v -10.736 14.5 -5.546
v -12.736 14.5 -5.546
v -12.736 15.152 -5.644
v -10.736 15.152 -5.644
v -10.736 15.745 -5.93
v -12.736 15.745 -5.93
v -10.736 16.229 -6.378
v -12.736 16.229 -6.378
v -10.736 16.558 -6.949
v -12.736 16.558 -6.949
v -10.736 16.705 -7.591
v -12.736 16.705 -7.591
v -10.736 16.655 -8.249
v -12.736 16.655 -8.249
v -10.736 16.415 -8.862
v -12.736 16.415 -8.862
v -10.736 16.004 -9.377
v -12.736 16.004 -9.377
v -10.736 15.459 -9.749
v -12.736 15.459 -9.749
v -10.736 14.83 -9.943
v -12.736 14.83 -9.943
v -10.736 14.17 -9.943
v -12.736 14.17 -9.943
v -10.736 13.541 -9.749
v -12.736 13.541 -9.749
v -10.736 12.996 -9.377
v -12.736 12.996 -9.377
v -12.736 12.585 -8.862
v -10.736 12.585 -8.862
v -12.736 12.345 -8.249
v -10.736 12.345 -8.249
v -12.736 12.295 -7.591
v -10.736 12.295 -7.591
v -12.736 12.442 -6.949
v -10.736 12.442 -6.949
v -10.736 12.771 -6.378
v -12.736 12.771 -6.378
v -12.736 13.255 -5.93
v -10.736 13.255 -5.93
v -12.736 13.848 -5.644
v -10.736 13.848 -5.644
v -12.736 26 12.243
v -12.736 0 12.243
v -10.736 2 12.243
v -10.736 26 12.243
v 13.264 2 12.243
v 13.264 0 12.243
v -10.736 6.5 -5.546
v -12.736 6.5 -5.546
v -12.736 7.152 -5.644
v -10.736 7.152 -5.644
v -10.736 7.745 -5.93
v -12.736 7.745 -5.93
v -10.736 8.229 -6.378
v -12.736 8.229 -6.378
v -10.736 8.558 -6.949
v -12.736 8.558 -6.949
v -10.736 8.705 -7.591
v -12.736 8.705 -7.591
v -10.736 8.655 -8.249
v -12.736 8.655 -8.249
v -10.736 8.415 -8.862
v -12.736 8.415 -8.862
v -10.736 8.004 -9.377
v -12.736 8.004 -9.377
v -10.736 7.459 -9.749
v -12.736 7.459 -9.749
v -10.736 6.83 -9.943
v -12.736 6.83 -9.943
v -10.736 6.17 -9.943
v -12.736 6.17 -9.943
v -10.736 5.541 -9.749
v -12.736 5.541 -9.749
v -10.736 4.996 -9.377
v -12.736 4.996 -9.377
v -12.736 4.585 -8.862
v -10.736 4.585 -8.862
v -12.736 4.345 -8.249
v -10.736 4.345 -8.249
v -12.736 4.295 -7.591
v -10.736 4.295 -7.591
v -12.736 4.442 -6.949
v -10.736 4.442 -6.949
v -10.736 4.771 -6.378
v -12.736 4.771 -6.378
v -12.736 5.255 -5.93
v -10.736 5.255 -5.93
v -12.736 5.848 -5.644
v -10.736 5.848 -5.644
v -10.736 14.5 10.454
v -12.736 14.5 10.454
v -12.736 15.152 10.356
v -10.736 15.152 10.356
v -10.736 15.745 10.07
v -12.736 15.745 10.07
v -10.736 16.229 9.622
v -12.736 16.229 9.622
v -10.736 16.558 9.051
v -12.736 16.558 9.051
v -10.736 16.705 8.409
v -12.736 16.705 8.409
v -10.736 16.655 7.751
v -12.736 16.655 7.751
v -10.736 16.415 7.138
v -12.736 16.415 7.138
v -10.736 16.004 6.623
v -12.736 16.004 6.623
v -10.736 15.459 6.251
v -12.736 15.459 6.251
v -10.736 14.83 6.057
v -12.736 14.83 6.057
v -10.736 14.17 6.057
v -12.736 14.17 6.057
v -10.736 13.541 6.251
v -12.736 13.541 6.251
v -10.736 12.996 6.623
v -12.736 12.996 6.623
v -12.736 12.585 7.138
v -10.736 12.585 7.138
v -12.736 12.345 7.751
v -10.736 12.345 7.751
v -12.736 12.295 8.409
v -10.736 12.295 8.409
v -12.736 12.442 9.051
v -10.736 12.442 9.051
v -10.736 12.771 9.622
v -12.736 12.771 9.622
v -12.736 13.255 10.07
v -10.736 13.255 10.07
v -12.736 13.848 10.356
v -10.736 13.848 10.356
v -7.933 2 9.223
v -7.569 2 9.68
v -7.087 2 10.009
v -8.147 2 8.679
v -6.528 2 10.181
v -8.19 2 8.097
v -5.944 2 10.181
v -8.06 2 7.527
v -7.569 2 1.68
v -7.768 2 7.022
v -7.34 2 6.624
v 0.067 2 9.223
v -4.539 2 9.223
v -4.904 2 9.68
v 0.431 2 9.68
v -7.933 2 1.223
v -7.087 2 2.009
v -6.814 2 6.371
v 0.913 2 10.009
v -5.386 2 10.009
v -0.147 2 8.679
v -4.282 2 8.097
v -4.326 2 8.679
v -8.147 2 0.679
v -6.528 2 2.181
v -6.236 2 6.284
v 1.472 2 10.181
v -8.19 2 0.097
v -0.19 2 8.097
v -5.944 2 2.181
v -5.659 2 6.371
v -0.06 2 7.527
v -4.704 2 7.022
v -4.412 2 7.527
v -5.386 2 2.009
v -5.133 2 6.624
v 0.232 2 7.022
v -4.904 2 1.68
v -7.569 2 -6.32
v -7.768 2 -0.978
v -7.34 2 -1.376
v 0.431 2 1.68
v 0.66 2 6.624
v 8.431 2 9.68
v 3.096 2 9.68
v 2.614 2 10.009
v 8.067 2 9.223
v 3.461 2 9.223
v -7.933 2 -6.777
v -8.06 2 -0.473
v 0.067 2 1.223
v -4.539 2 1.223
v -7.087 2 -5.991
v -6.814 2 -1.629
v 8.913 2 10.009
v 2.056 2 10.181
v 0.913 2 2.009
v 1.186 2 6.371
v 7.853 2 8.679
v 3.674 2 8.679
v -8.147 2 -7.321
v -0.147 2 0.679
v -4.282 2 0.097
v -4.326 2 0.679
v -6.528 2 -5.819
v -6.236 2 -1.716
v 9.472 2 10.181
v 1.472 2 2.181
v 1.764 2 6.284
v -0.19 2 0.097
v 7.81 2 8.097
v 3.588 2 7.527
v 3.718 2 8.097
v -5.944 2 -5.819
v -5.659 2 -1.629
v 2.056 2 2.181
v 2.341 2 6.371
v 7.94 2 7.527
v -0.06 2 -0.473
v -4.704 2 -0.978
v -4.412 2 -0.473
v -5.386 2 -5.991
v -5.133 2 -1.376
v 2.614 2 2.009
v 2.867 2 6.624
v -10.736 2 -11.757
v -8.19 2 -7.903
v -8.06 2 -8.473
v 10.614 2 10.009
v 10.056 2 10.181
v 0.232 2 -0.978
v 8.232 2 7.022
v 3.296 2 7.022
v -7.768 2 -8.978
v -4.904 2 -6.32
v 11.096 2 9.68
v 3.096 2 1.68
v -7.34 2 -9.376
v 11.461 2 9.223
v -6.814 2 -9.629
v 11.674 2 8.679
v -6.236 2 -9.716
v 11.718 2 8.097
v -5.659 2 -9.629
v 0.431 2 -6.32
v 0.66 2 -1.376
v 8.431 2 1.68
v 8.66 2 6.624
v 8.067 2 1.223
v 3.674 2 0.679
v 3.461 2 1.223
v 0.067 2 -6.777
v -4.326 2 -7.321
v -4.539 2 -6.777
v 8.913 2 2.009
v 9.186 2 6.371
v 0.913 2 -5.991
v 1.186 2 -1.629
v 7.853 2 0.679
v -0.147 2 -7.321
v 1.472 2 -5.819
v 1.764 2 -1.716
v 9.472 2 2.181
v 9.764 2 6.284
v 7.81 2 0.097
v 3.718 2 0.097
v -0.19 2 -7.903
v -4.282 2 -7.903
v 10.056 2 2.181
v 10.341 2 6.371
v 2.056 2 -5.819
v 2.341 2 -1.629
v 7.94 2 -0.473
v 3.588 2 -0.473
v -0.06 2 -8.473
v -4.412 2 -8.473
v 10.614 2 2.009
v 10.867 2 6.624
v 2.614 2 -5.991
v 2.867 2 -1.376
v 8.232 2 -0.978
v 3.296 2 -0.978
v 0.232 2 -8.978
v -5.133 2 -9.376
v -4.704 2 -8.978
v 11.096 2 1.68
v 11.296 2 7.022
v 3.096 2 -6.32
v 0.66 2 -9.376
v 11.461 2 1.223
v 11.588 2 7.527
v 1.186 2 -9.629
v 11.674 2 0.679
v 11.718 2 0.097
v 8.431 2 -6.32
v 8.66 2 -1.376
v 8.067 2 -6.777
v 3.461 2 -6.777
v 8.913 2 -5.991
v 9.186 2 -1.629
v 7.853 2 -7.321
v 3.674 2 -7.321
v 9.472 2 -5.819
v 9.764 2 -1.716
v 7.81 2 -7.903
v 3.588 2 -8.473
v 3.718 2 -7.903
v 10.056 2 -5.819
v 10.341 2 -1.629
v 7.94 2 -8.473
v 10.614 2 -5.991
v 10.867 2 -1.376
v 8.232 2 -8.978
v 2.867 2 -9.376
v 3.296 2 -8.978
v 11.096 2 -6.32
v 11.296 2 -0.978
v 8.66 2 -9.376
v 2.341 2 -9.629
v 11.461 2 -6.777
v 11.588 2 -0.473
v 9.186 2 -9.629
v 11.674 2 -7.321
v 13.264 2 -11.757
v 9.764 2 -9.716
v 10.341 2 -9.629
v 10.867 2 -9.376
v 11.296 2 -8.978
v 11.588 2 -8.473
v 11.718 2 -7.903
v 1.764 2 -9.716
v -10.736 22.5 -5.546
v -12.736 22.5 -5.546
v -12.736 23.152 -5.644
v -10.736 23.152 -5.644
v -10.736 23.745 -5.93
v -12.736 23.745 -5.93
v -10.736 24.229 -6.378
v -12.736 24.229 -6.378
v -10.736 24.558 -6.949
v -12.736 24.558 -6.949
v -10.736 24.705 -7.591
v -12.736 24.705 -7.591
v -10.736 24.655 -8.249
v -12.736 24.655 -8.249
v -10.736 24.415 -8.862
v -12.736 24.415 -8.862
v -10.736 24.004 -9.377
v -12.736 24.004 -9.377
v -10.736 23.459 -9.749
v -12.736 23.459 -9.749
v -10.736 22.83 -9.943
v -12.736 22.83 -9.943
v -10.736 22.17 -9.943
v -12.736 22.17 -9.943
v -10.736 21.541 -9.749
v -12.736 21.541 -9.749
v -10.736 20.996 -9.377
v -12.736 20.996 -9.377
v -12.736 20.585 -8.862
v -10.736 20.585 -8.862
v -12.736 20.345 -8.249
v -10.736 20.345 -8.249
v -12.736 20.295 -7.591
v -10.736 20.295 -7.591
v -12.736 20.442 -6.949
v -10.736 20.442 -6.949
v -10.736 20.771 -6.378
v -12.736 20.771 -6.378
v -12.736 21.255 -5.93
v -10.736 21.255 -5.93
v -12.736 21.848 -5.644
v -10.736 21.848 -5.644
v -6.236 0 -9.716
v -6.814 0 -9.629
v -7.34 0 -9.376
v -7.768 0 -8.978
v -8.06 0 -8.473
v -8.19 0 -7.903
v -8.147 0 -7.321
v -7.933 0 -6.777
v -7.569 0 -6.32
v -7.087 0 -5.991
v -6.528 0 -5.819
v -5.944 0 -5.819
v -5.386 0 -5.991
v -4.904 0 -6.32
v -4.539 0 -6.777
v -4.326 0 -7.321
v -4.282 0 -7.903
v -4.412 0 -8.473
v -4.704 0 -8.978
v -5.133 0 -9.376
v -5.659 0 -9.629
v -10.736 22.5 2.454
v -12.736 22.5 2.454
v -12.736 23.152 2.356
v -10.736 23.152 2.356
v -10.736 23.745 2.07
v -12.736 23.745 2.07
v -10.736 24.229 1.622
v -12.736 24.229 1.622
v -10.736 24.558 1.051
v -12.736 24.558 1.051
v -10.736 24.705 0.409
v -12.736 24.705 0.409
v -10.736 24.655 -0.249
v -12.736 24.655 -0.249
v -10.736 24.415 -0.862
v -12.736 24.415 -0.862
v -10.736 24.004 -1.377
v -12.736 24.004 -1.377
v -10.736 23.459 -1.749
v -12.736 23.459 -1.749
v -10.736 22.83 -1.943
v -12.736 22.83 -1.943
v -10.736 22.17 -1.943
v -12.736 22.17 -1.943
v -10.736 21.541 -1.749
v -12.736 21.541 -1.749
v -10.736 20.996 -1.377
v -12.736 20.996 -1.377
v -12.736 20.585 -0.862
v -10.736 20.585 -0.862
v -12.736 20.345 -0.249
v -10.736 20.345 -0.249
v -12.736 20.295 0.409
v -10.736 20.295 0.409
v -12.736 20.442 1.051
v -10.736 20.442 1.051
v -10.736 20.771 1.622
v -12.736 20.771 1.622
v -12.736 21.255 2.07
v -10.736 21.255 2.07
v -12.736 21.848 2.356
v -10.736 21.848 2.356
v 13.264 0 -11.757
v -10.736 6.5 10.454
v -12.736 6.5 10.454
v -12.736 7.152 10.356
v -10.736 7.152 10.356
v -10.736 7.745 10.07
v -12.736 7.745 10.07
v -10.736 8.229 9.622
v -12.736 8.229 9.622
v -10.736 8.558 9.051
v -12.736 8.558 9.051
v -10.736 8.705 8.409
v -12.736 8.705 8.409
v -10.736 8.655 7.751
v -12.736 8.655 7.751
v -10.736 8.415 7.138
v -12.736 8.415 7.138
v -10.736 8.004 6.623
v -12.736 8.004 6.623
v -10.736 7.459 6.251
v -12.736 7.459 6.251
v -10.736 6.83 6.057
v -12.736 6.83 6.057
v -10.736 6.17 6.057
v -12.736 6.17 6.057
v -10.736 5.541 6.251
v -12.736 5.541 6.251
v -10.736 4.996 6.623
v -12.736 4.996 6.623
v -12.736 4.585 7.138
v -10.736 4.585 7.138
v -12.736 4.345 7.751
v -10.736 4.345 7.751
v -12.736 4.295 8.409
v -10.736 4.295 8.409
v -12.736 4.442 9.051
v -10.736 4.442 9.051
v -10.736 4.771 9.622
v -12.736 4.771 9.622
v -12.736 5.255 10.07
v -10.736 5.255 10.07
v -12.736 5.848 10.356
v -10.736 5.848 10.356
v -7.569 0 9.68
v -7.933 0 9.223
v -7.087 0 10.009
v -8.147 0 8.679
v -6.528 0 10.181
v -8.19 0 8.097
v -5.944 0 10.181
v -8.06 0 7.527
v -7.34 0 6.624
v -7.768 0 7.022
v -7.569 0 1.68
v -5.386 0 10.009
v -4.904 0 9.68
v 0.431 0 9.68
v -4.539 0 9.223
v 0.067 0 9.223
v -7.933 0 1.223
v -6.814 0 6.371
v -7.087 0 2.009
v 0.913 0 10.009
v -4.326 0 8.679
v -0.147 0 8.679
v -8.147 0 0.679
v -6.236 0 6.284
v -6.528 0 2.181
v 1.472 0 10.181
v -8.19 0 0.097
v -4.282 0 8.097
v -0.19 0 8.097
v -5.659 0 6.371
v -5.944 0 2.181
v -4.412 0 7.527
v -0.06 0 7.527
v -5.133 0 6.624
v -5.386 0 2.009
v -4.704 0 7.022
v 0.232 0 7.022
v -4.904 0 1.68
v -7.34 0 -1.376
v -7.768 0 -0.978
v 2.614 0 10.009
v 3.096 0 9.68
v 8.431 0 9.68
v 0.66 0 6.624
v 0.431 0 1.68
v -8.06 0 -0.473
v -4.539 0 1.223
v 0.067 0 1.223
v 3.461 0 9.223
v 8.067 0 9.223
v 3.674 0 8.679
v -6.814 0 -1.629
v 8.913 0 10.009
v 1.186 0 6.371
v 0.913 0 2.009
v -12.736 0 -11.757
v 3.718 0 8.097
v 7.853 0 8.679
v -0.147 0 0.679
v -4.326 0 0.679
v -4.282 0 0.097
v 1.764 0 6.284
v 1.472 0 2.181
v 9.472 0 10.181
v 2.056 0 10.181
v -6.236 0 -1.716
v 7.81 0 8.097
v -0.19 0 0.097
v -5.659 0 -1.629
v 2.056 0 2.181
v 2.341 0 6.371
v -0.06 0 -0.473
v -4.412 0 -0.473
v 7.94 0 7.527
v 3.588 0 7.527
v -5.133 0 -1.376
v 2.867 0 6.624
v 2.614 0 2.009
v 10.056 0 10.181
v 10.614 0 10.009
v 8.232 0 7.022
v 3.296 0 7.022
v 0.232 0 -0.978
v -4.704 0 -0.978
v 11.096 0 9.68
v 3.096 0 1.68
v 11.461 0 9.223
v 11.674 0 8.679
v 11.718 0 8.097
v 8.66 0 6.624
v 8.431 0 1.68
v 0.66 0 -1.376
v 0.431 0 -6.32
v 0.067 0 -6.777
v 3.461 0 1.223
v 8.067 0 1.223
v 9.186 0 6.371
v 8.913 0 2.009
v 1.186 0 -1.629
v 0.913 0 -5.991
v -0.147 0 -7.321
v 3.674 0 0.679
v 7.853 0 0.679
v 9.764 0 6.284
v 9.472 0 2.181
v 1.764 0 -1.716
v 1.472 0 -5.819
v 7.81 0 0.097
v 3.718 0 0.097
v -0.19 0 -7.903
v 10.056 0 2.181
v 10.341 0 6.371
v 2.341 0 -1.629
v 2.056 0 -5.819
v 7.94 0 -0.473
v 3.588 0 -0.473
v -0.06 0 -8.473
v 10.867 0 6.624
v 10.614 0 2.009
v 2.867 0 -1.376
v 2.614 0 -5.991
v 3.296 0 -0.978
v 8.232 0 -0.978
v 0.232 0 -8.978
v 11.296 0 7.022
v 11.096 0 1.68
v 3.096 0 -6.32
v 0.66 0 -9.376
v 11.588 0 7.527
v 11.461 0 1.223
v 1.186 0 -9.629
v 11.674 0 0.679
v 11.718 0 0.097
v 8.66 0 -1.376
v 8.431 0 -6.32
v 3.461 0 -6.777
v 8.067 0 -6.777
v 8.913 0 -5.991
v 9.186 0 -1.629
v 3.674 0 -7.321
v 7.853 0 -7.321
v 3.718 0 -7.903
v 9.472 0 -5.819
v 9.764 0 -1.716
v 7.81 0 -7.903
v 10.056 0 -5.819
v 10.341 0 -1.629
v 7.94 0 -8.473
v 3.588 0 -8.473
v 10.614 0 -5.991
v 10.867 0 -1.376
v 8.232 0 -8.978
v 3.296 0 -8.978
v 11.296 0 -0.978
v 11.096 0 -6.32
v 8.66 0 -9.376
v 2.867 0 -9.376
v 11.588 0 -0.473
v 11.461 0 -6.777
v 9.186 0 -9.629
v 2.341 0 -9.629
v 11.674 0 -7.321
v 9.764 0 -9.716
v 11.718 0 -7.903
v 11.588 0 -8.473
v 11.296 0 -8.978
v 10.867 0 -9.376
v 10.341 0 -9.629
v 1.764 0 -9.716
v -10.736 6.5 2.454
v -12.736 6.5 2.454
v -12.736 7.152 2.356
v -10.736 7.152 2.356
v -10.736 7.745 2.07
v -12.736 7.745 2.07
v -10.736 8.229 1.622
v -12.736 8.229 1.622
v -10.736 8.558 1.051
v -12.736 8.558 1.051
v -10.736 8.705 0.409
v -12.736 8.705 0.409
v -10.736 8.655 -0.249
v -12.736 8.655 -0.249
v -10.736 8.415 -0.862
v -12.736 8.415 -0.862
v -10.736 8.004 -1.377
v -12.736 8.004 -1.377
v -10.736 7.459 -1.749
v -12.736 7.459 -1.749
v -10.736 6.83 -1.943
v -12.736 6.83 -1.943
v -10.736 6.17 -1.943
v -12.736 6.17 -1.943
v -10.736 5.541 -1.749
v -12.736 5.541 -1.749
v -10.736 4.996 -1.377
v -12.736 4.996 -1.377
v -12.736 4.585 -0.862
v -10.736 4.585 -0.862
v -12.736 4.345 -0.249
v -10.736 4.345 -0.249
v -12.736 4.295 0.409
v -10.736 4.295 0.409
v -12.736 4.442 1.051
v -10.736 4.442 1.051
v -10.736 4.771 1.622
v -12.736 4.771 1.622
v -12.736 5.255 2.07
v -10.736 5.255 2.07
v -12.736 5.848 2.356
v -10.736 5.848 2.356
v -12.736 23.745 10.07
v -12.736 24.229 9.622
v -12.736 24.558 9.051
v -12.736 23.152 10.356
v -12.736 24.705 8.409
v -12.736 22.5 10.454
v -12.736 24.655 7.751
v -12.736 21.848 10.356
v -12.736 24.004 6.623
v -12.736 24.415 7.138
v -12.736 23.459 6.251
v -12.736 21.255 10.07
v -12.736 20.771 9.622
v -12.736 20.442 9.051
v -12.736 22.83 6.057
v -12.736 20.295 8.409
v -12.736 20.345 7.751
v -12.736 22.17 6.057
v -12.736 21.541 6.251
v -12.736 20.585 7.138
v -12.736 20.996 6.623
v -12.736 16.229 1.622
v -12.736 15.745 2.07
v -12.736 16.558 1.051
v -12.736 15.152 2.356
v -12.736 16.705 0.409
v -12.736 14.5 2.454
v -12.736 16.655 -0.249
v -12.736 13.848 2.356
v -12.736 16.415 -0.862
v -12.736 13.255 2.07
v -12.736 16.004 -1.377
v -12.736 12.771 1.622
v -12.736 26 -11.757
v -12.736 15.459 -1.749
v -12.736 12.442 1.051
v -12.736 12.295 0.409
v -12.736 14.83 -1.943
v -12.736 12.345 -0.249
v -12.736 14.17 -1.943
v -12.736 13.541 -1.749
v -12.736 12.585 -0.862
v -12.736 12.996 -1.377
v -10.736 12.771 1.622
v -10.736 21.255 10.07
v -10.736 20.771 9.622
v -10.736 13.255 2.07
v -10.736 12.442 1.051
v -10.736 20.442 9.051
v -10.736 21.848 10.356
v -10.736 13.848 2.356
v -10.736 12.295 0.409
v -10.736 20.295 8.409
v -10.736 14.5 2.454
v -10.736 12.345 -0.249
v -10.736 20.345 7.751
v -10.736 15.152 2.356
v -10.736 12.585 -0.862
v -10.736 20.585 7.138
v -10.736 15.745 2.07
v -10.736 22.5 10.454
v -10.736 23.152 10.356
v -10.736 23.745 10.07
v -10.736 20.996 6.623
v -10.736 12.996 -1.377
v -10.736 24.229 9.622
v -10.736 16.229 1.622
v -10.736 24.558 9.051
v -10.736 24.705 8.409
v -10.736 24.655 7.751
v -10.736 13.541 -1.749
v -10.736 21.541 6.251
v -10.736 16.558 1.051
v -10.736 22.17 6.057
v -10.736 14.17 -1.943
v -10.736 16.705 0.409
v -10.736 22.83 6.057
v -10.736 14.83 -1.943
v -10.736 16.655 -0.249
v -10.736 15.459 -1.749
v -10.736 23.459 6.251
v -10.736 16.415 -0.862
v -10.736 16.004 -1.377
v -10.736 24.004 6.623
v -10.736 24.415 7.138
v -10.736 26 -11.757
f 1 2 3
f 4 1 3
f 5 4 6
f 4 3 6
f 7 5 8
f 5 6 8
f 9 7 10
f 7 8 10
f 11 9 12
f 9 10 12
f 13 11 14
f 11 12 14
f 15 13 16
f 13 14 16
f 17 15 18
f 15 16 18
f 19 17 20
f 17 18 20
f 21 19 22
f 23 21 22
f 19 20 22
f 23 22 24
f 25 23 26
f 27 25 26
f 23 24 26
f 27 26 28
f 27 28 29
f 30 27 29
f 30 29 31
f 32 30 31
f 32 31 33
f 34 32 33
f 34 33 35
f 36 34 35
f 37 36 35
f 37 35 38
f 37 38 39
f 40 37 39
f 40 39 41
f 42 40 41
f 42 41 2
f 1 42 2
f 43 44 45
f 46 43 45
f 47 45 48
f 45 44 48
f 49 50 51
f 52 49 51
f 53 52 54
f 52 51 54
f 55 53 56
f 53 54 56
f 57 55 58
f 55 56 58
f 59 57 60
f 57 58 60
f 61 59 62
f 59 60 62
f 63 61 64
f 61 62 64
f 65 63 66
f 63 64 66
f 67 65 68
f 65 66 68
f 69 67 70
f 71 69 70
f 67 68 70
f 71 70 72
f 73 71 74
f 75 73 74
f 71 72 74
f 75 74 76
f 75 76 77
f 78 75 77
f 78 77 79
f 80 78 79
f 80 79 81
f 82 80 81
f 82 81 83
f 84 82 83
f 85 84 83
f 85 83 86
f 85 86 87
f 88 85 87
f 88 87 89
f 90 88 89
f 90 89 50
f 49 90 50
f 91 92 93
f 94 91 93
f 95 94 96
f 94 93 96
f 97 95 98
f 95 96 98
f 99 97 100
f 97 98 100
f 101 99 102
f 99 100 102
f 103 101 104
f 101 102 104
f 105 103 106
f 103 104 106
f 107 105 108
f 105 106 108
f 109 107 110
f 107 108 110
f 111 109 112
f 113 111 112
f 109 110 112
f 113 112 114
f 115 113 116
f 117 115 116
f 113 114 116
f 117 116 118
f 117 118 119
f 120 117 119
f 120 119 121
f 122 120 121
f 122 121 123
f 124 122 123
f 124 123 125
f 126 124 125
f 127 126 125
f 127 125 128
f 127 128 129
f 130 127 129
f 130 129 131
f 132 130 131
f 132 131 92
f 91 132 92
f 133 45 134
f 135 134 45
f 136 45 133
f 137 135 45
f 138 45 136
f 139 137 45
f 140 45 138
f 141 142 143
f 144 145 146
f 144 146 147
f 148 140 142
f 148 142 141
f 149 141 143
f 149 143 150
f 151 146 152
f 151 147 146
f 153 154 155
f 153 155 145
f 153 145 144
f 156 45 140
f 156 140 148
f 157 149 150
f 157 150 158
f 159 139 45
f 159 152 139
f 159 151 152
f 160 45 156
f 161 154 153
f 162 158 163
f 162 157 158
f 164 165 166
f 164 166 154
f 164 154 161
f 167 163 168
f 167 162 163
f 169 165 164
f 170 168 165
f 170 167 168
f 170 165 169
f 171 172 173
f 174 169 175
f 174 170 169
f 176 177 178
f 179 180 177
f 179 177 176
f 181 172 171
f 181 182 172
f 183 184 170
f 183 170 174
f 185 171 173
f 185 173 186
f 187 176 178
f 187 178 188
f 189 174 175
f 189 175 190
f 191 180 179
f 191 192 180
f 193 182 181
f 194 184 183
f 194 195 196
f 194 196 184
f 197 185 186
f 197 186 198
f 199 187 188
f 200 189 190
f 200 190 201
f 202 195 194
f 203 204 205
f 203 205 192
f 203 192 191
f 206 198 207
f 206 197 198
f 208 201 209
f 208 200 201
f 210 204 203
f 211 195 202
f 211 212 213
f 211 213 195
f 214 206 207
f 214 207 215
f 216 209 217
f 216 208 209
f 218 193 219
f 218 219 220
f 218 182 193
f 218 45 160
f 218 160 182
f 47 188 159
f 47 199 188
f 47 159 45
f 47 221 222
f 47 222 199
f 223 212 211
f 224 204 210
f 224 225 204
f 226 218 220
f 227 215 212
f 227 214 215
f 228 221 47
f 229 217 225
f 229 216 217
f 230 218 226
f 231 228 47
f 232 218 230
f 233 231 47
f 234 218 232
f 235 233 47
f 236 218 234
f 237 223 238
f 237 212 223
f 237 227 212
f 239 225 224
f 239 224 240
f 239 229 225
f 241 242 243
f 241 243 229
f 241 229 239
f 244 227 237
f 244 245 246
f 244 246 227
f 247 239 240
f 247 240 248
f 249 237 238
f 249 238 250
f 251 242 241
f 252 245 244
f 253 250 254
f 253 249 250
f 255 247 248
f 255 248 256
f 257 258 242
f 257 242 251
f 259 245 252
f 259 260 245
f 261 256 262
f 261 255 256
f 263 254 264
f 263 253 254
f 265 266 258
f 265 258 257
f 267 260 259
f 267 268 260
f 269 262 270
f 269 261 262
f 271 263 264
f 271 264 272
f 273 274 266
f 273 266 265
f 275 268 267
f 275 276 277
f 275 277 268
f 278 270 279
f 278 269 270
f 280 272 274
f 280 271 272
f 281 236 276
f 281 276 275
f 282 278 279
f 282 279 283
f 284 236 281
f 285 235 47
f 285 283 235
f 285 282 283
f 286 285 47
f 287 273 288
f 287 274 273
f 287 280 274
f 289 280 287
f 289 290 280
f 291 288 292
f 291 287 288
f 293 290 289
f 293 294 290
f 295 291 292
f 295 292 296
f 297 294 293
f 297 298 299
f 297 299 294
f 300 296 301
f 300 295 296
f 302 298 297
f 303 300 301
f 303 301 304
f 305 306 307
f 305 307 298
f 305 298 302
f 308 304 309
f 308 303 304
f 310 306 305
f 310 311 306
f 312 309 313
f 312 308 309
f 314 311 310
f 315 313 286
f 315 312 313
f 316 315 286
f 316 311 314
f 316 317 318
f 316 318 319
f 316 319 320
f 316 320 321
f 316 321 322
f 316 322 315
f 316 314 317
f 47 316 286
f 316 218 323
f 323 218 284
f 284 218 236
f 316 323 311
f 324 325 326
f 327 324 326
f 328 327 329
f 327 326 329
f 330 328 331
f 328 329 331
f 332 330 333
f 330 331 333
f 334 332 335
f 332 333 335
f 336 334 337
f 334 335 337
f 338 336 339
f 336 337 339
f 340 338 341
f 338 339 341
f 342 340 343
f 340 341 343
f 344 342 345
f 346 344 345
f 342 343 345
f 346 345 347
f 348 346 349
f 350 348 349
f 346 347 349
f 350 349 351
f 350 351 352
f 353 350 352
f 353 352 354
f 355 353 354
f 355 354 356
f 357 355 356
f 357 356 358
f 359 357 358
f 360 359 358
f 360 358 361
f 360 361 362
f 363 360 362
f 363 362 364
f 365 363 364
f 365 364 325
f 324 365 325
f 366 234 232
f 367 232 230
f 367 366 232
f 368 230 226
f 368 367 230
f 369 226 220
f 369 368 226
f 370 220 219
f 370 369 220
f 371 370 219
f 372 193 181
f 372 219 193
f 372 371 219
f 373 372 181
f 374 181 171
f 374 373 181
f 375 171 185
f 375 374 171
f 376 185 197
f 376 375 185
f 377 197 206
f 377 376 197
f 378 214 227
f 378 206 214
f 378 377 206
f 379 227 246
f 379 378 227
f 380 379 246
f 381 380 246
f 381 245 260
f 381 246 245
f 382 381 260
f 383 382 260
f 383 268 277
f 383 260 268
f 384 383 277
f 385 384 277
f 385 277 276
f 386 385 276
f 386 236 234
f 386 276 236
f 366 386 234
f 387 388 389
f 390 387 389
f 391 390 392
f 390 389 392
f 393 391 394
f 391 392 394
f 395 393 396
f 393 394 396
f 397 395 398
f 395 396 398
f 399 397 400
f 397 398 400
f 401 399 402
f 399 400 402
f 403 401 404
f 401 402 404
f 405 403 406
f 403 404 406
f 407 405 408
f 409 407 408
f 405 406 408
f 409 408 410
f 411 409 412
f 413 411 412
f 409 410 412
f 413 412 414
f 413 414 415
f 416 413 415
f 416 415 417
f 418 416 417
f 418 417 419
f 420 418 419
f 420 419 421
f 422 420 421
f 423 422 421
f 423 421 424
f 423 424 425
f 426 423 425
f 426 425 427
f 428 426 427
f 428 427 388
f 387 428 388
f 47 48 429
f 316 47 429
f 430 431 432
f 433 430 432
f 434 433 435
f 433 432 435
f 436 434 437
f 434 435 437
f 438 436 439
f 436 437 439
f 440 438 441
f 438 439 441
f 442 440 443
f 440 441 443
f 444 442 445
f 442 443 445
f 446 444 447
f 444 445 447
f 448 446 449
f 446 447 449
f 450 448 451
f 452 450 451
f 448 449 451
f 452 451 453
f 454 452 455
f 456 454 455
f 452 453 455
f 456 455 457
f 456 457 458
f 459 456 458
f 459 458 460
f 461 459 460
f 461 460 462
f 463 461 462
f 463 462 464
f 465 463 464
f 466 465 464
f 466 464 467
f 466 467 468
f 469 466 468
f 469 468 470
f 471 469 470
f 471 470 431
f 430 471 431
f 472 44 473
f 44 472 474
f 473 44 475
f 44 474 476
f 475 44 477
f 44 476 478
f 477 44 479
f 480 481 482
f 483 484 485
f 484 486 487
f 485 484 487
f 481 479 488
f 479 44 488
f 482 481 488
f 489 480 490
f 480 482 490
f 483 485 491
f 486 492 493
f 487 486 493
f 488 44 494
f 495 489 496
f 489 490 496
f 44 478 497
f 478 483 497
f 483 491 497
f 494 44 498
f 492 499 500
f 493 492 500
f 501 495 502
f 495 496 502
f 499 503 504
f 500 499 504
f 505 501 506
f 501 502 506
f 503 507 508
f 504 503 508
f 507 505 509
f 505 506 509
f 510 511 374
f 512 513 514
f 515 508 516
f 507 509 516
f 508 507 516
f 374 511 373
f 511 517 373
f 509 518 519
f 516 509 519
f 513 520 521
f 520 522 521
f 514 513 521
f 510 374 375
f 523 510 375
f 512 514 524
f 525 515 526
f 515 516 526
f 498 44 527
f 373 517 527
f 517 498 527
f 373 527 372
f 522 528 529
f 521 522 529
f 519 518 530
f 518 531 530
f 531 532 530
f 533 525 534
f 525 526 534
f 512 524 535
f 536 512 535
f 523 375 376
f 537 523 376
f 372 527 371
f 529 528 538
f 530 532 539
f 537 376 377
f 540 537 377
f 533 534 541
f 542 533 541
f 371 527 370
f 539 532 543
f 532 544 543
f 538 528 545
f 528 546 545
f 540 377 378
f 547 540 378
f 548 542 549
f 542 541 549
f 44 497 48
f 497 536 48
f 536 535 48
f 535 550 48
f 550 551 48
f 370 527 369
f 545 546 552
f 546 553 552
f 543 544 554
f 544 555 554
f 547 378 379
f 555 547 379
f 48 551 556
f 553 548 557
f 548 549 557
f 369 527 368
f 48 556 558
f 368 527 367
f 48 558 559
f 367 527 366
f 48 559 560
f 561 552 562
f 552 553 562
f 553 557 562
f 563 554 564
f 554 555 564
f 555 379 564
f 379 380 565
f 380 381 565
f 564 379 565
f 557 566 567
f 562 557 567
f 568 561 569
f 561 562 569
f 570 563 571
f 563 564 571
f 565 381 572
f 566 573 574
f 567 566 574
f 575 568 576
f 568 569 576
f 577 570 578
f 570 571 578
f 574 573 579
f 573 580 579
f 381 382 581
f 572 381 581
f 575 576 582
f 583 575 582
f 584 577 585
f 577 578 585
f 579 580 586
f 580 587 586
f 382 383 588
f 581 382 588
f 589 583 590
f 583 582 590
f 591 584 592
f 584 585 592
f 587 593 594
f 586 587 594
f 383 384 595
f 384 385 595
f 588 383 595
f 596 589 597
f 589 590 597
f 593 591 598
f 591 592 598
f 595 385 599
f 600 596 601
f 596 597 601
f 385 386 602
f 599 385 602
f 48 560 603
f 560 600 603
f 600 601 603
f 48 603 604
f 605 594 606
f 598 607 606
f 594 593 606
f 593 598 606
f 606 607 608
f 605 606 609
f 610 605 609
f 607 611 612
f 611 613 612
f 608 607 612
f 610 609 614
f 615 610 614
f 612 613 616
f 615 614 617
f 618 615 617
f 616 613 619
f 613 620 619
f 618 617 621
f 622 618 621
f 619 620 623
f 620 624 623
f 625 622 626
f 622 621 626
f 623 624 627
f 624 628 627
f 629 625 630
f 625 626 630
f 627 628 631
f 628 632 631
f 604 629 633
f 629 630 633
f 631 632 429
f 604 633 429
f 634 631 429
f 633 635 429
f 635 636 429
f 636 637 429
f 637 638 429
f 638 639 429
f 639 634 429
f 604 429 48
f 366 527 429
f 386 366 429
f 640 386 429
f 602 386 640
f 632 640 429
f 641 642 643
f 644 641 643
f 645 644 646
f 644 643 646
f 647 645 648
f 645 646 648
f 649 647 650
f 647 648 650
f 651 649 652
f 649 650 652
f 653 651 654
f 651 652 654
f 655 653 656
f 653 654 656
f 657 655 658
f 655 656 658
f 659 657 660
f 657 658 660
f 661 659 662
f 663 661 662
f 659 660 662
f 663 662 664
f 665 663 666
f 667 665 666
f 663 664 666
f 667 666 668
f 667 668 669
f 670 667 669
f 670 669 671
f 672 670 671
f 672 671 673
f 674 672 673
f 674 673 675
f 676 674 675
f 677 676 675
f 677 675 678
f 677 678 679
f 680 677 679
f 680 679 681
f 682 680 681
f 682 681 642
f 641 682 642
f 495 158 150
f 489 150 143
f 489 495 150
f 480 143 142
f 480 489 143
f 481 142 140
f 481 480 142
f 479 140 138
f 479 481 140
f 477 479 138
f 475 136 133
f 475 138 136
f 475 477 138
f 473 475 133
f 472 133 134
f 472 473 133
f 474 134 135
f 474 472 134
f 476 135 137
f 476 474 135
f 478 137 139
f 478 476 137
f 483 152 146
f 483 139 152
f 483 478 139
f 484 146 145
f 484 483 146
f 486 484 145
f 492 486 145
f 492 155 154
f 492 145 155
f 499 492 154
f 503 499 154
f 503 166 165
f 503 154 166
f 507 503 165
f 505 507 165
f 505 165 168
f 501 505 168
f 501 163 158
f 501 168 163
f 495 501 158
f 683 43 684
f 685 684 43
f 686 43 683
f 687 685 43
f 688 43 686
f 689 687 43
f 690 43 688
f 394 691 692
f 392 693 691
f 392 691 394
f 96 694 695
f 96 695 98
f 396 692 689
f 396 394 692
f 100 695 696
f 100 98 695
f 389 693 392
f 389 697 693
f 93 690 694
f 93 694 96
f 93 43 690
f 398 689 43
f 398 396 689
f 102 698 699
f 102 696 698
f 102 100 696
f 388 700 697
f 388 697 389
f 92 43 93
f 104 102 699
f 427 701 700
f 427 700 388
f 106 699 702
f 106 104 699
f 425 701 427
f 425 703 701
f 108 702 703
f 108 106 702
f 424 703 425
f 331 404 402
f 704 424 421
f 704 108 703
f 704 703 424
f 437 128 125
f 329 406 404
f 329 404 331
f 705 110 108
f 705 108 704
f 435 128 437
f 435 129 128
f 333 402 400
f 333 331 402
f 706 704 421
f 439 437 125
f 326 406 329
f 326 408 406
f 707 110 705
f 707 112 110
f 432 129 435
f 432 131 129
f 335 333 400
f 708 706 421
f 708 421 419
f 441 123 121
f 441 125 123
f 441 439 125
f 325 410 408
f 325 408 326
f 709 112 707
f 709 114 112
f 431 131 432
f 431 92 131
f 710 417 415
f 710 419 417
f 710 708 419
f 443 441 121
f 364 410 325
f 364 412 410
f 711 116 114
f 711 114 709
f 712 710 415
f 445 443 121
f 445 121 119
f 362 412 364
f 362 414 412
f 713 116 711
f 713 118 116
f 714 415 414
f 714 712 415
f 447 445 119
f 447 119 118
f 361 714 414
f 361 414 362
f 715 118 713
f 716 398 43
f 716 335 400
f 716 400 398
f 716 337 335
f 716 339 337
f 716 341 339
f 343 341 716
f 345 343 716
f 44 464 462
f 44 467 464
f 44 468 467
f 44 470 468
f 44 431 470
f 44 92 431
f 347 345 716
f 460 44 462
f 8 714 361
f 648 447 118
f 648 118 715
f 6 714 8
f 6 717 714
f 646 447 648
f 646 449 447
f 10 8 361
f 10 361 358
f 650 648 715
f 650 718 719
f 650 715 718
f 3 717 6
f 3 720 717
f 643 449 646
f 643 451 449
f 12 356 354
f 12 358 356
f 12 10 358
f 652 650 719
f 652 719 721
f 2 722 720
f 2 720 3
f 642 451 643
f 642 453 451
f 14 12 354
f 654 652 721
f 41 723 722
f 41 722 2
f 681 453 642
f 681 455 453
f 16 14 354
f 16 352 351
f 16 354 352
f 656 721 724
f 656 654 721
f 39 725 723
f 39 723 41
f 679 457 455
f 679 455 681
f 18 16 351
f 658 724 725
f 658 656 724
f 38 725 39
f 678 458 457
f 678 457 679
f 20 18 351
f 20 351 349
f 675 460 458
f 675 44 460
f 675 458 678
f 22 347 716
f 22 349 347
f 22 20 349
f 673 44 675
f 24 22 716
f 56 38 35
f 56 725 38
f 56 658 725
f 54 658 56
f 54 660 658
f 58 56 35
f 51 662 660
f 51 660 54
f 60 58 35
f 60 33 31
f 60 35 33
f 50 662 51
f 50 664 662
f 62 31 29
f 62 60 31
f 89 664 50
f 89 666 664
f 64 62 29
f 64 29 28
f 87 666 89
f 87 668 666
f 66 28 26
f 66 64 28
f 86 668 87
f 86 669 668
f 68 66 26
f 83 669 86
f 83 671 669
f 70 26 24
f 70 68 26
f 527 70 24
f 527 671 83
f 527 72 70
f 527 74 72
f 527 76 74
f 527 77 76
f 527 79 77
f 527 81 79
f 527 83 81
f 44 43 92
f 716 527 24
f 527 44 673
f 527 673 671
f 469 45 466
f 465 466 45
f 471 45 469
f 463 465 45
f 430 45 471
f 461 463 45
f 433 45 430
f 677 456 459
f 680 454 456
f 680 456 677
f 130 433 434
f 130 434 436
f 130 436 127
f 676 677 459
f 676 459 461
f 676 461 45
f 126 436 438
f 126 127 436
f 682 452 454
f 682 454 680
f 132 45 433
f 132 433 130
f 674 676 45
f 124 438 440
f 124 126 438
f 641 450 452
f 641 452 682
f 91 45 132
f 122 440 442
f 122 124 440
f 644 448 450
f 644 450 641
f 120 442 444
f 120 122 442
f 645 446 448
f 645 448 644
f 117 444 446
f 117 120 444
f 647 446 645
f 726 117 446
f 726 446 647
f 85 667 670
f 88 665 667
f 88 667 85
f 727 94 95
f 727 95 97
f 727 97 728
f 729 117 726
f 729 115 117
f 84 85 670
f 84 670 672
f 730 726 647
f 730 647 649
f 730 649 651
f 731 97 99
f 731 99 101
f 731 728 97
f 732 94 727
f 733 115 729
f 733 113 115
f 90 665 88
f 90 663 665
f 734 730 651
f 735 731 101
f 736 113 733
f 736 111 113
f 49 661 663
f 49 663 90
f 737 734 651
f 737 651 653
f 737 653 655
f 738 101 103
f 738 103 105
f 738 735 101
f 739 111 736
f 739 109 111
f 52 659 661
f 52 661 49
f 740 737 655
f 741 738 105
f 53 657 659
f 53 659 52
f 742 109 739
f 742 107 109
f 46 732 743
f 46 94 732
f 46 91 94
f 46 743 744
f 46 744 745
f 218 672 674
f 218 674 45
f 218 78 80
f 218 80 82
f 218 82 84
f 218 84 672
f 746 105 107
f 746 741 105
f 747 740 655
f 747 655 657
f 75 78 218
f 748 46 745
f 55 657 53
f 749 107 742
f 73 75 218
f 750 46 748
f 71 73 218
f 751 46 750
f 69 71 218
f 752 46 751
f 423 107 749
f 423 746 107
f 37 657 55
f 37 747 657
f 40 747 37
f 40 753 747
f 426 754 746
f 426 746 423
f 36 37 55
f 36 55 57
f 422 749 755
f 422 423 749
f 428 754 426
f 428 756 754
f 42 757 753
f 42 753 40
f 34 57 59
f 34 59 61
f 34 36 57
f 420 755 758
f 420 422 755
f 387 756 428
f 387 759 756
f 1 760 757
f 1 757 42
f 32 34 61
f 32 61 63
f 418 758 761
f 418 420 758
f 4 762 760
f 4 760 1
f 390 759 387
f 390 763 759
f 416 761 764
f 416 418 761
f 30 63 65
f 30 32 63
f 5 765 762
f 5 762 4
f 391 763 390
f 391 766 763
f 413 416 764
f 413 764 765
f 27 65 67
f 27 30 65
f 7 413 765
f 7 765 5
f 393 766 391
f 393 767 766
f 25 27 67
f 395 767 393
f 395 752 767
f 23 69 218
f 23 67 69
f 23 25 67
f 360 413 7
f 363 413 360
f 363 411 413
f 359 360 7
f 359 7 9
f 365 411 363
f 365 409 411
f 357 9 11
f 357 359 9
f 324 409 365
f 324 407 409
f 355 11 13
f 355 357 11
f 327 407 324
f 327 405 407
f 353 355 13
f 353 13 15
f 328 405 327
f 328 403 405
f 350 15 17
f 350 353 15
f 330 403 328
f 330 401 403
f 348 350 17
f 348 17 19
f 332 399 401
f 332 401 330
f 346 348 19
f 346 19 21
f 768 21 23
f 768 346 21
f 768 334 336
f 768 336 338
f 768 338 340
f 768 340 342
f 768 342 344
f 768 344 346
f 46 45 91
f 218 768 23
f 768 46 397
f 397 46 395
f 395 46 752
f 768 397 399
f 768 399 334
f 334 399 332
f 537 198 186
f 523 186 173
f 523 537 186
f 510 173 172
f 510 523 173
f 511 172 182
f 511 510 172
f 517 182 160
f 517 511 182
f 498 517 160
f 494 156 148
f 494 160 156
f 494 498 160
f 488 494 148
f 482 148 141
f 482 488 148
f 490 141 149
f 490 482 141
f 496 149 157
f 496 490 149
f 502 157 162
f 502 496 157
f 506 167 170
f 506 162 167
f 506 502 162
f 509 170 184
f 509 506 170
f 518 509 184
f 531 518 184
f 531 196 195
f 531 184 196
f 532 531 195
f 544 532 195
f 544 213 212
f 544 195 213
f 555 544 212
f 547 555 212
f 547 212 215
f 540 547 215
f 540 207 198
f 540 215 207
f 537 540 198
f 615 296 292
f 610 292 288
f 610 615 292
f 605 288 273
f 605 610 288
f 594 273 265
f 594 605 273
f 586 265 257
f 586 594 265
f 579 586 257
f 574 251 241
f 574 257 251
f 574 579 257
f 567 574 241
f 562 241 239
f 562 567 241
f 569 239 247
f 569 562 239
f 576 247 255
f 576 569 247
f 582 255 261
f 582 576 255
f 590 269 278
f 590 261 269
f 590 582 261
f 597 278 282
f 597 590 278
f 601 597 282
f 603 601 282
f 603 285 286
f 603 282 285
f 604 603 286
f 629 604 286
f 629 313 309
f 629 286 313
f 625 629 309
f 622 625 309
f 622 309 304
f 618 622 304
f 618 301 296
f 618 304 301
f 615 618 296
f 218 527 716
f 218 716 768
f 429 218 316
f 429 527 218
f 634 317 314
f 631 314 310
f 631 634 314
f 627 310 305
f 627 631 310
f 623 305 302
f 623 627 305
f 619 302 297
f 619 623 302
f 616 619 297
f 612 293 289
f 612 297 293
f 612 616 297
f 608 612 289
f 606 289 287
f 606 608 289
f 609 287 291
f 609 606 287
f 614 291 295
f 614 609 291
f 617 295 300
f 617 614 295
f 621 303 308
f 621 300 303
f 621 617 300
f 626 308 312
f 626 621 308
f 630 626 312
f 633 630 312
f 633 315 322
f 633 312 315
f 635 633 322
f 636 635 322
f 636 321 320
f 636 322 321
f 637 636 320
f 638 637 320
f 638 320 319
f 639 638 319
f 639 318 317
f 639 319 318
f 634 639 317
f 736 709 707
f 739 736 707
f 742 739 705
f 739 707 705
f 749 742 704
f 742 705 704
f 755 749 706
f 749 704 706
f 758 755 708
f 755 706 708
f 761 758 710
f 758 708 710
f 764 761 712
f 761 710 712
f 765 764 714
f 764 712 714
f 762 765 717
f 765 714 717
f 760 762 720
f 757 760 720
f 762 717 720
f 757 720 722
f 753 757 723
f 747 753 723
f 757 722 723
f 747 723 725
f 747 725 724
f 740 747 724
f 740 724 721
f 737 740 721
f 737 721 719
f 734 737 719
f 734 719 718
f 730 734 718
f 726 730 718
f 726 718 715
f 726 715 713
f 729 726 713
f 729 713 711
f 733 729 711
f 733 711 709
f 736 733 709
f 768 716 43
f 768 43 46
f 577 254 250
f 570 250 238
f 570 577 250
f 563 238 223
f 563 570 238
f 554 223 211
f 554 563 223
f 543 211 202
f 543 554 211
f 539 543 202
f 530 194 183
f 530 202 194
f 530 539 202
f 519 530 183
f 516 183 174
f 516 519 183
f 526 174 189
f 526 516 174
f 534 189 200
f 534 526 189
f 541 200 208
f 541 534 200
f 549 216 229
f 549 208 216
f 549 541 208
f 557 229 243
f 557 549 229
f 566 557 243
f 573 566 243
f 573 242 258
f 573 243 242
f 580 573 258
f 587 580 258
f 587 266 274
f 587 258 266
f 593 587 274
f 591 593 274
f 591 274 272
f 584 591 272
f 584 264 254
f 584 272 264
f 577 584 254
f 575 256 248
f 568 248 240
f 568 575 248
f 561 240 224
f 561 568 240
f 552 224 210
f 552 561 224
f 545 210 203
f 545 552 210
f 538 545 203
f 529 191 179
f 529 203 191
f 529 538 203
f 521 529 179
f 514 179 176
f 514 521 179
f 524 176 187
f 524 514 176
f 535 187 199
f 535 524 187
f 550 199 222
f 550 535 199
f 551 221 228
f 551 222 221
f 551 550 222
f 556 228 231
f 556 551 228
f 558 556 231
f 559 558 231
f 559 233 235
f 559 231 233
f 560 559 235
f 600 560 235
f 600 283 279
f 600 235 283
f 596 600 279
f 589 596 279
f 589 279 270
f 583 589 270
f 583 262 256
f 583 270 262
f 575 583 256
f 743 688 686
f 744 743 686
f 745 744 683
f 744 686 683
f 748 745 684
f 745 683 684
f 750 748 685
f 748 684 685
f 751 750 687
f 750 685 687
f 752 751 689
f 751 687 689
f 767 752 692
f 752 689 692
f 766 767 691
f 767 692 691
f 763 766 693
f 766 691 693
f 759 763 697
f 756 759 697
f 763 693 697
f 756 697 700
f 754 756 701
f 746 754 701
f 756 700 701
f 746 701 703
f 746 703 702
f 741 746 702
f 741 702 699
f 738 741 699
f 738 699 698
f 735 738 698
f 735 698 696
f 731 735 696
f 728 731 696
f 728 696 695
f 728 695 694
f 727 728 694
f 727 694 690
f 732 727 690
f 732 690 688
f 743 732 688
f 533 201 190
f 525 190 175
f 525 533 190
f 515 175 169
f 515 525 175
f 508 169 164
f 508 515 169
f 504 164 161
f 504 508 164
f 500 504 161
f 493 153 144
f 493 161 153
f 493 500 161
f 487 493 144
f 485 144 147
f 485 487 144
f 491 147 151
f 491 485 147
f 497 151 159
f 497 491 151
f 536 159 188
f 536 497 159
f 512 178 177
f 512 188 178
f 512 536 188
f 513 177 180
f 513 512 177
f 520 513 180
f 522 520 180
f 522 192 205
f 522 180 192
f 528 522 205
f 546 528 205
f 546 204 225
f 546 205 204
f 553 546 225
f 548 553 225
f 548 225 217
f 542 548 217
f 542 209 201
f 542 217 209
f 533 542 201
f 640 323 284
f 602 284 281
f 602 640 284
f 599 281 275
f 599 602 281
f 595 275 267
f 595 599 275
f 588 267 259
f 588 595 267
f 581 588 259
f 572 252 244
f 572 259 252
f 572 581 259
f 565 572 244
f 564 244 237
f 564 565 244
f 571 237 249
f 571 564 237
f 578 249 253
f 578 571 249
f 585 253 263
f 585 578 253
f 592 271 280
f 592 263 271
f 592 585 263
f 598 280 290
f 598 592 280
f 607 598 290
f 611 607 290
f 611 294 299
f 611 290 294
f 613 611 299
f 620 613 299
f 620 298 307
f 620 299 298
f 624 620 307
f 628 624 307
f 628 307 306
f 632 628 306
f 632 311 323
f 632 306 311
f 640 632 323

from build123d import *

# Parameters (mm, degrees)
SKETCH_1_W          = 26
SKETCH_1_H          = 24
SKETCH_1_R          = 1.959448434
EXTRUDE_1_DEPTH     = 26
SKETCH_2_W          = 24
SKETCH_2_H          = 24
CUT_EXTRUDE_1_DEPTH = 24
SKETCH_3_R          = 2.210837502
CUT_EXTRUDE_2_DEPTH = 24


with BuildPart() as part:
    # 草图1 → 凸台-拉伸1 (new body)
    with BuildSketch(Plane(origin=(0, 0, 0), x_dir=(1, 0, 0), z_dir=(0, 1, 0))):
        with Locations((0.263585178, -0.243309395)):
            Rectangle(SKETCH_1_W, SKETCH_1_H)
        with Locations(Location((9.763585178, -8.243309395, 0), (0, 0, 90))):
            Circle(SKETCH_1_R, mode=Mode.SUBTRACT)
        with Locations(Location((9.763585178, -0.243309395, 0), (0, 0, 90))):
            Circle(SKETCH_1_R, mode=Mode.SUBTRACT)
        with Locations(Location((9.763585178, 7.756690605, 0), (0, 0, 90))):
            Circle(SKETCH_1_R, mode=Mode.SUBTRACT)
        with Locations(Location((1.763585178, -8.243309395, 0), (0, 0, 90))):
            Circle(SKETCH_1_R, mode=Mode.SUBTRACT)
        with Locations(Location((1.763585178, -0.243309395, 0), (0, 0, 90))):
            Circle(SKETCH_1_R, mode=Mode.SUBTRACT)
        with Locations(Location((1.763585178, 7.756690605, 0), (0, 0, 90))):
            Circle(SKETCH_1_R, mode=Mode.SUBTRACT)
        with Locations(Location((-6.236414822, -8.243309395, 0), (0, 0, 90))):
            Circle(SKETCH_1_R, mode=Mode.SUBTRACT)
        with Locations(Location((-6.236414822, -0.243309395, 0), (0, 0, 90))):
            Circle(SKETCH_1_R, mode=Mode.SUBTRACT)
        with Locations(Location((-6.236414822, 7.756690605, 0), (0, 0, 90))):
            Circle(SKETCH_1_R, mode=Mode.SUBTRACT)
    extrude(amount=EXTRUDE_1_DEPTH)

    # 草图2 → 切除-拉伸1 (cut)
    with BuildSketch(Plane(origin=(0, 26, 0), x_dir=(1, 0, 0), z_dir=(0, 1, 0))):
        with Locations((1.263585178, -0.243309395)):
            Rectangle(SKETCH_2_W, SKETCH_2_H)
    extrude(amount=-CUT_EXTRUDE_1_DEPTH, mode=Mode.SUBTRACT)

    # 草图3 → 切除-拉伸2 (cut)
    with BuildSketch(Plane.ZY.offset(12.736414822)):
        with Locations((-7.756690605, 22.5)):
            Circle(SKETCH_3_R)
        with Locations((0.243309395, 22.5)):
            Circle(SKETCH_3_R)
        with Locations((8.243309395, 22.5)):
            Circle(SKETCH_3_R)
        with Locations((-7.756690605, 14.5)):
            Circle(SKETCH_3_R)
        with Locations((0.243309395, 14.5)):
            Circle(SKETCH_3_R)
        with Locations((8.243309395, 14.5)):
            Circle(SKETCH_3_R)
        with Locations((-7.756690605, 6.5)):
            Circle(SKETCH_3_R)
        with Locations((0.243309395, 6.5)):
            Circle(SKETCH_3_R)
        with Locations((8.243309395, 6.5)):
            Circle(SKETCH_3_R)
    extrude(amount=-CUT_EXTRUDE_2_DEPTH, mode=Mode.SUBTRACT)


solid = part.part
